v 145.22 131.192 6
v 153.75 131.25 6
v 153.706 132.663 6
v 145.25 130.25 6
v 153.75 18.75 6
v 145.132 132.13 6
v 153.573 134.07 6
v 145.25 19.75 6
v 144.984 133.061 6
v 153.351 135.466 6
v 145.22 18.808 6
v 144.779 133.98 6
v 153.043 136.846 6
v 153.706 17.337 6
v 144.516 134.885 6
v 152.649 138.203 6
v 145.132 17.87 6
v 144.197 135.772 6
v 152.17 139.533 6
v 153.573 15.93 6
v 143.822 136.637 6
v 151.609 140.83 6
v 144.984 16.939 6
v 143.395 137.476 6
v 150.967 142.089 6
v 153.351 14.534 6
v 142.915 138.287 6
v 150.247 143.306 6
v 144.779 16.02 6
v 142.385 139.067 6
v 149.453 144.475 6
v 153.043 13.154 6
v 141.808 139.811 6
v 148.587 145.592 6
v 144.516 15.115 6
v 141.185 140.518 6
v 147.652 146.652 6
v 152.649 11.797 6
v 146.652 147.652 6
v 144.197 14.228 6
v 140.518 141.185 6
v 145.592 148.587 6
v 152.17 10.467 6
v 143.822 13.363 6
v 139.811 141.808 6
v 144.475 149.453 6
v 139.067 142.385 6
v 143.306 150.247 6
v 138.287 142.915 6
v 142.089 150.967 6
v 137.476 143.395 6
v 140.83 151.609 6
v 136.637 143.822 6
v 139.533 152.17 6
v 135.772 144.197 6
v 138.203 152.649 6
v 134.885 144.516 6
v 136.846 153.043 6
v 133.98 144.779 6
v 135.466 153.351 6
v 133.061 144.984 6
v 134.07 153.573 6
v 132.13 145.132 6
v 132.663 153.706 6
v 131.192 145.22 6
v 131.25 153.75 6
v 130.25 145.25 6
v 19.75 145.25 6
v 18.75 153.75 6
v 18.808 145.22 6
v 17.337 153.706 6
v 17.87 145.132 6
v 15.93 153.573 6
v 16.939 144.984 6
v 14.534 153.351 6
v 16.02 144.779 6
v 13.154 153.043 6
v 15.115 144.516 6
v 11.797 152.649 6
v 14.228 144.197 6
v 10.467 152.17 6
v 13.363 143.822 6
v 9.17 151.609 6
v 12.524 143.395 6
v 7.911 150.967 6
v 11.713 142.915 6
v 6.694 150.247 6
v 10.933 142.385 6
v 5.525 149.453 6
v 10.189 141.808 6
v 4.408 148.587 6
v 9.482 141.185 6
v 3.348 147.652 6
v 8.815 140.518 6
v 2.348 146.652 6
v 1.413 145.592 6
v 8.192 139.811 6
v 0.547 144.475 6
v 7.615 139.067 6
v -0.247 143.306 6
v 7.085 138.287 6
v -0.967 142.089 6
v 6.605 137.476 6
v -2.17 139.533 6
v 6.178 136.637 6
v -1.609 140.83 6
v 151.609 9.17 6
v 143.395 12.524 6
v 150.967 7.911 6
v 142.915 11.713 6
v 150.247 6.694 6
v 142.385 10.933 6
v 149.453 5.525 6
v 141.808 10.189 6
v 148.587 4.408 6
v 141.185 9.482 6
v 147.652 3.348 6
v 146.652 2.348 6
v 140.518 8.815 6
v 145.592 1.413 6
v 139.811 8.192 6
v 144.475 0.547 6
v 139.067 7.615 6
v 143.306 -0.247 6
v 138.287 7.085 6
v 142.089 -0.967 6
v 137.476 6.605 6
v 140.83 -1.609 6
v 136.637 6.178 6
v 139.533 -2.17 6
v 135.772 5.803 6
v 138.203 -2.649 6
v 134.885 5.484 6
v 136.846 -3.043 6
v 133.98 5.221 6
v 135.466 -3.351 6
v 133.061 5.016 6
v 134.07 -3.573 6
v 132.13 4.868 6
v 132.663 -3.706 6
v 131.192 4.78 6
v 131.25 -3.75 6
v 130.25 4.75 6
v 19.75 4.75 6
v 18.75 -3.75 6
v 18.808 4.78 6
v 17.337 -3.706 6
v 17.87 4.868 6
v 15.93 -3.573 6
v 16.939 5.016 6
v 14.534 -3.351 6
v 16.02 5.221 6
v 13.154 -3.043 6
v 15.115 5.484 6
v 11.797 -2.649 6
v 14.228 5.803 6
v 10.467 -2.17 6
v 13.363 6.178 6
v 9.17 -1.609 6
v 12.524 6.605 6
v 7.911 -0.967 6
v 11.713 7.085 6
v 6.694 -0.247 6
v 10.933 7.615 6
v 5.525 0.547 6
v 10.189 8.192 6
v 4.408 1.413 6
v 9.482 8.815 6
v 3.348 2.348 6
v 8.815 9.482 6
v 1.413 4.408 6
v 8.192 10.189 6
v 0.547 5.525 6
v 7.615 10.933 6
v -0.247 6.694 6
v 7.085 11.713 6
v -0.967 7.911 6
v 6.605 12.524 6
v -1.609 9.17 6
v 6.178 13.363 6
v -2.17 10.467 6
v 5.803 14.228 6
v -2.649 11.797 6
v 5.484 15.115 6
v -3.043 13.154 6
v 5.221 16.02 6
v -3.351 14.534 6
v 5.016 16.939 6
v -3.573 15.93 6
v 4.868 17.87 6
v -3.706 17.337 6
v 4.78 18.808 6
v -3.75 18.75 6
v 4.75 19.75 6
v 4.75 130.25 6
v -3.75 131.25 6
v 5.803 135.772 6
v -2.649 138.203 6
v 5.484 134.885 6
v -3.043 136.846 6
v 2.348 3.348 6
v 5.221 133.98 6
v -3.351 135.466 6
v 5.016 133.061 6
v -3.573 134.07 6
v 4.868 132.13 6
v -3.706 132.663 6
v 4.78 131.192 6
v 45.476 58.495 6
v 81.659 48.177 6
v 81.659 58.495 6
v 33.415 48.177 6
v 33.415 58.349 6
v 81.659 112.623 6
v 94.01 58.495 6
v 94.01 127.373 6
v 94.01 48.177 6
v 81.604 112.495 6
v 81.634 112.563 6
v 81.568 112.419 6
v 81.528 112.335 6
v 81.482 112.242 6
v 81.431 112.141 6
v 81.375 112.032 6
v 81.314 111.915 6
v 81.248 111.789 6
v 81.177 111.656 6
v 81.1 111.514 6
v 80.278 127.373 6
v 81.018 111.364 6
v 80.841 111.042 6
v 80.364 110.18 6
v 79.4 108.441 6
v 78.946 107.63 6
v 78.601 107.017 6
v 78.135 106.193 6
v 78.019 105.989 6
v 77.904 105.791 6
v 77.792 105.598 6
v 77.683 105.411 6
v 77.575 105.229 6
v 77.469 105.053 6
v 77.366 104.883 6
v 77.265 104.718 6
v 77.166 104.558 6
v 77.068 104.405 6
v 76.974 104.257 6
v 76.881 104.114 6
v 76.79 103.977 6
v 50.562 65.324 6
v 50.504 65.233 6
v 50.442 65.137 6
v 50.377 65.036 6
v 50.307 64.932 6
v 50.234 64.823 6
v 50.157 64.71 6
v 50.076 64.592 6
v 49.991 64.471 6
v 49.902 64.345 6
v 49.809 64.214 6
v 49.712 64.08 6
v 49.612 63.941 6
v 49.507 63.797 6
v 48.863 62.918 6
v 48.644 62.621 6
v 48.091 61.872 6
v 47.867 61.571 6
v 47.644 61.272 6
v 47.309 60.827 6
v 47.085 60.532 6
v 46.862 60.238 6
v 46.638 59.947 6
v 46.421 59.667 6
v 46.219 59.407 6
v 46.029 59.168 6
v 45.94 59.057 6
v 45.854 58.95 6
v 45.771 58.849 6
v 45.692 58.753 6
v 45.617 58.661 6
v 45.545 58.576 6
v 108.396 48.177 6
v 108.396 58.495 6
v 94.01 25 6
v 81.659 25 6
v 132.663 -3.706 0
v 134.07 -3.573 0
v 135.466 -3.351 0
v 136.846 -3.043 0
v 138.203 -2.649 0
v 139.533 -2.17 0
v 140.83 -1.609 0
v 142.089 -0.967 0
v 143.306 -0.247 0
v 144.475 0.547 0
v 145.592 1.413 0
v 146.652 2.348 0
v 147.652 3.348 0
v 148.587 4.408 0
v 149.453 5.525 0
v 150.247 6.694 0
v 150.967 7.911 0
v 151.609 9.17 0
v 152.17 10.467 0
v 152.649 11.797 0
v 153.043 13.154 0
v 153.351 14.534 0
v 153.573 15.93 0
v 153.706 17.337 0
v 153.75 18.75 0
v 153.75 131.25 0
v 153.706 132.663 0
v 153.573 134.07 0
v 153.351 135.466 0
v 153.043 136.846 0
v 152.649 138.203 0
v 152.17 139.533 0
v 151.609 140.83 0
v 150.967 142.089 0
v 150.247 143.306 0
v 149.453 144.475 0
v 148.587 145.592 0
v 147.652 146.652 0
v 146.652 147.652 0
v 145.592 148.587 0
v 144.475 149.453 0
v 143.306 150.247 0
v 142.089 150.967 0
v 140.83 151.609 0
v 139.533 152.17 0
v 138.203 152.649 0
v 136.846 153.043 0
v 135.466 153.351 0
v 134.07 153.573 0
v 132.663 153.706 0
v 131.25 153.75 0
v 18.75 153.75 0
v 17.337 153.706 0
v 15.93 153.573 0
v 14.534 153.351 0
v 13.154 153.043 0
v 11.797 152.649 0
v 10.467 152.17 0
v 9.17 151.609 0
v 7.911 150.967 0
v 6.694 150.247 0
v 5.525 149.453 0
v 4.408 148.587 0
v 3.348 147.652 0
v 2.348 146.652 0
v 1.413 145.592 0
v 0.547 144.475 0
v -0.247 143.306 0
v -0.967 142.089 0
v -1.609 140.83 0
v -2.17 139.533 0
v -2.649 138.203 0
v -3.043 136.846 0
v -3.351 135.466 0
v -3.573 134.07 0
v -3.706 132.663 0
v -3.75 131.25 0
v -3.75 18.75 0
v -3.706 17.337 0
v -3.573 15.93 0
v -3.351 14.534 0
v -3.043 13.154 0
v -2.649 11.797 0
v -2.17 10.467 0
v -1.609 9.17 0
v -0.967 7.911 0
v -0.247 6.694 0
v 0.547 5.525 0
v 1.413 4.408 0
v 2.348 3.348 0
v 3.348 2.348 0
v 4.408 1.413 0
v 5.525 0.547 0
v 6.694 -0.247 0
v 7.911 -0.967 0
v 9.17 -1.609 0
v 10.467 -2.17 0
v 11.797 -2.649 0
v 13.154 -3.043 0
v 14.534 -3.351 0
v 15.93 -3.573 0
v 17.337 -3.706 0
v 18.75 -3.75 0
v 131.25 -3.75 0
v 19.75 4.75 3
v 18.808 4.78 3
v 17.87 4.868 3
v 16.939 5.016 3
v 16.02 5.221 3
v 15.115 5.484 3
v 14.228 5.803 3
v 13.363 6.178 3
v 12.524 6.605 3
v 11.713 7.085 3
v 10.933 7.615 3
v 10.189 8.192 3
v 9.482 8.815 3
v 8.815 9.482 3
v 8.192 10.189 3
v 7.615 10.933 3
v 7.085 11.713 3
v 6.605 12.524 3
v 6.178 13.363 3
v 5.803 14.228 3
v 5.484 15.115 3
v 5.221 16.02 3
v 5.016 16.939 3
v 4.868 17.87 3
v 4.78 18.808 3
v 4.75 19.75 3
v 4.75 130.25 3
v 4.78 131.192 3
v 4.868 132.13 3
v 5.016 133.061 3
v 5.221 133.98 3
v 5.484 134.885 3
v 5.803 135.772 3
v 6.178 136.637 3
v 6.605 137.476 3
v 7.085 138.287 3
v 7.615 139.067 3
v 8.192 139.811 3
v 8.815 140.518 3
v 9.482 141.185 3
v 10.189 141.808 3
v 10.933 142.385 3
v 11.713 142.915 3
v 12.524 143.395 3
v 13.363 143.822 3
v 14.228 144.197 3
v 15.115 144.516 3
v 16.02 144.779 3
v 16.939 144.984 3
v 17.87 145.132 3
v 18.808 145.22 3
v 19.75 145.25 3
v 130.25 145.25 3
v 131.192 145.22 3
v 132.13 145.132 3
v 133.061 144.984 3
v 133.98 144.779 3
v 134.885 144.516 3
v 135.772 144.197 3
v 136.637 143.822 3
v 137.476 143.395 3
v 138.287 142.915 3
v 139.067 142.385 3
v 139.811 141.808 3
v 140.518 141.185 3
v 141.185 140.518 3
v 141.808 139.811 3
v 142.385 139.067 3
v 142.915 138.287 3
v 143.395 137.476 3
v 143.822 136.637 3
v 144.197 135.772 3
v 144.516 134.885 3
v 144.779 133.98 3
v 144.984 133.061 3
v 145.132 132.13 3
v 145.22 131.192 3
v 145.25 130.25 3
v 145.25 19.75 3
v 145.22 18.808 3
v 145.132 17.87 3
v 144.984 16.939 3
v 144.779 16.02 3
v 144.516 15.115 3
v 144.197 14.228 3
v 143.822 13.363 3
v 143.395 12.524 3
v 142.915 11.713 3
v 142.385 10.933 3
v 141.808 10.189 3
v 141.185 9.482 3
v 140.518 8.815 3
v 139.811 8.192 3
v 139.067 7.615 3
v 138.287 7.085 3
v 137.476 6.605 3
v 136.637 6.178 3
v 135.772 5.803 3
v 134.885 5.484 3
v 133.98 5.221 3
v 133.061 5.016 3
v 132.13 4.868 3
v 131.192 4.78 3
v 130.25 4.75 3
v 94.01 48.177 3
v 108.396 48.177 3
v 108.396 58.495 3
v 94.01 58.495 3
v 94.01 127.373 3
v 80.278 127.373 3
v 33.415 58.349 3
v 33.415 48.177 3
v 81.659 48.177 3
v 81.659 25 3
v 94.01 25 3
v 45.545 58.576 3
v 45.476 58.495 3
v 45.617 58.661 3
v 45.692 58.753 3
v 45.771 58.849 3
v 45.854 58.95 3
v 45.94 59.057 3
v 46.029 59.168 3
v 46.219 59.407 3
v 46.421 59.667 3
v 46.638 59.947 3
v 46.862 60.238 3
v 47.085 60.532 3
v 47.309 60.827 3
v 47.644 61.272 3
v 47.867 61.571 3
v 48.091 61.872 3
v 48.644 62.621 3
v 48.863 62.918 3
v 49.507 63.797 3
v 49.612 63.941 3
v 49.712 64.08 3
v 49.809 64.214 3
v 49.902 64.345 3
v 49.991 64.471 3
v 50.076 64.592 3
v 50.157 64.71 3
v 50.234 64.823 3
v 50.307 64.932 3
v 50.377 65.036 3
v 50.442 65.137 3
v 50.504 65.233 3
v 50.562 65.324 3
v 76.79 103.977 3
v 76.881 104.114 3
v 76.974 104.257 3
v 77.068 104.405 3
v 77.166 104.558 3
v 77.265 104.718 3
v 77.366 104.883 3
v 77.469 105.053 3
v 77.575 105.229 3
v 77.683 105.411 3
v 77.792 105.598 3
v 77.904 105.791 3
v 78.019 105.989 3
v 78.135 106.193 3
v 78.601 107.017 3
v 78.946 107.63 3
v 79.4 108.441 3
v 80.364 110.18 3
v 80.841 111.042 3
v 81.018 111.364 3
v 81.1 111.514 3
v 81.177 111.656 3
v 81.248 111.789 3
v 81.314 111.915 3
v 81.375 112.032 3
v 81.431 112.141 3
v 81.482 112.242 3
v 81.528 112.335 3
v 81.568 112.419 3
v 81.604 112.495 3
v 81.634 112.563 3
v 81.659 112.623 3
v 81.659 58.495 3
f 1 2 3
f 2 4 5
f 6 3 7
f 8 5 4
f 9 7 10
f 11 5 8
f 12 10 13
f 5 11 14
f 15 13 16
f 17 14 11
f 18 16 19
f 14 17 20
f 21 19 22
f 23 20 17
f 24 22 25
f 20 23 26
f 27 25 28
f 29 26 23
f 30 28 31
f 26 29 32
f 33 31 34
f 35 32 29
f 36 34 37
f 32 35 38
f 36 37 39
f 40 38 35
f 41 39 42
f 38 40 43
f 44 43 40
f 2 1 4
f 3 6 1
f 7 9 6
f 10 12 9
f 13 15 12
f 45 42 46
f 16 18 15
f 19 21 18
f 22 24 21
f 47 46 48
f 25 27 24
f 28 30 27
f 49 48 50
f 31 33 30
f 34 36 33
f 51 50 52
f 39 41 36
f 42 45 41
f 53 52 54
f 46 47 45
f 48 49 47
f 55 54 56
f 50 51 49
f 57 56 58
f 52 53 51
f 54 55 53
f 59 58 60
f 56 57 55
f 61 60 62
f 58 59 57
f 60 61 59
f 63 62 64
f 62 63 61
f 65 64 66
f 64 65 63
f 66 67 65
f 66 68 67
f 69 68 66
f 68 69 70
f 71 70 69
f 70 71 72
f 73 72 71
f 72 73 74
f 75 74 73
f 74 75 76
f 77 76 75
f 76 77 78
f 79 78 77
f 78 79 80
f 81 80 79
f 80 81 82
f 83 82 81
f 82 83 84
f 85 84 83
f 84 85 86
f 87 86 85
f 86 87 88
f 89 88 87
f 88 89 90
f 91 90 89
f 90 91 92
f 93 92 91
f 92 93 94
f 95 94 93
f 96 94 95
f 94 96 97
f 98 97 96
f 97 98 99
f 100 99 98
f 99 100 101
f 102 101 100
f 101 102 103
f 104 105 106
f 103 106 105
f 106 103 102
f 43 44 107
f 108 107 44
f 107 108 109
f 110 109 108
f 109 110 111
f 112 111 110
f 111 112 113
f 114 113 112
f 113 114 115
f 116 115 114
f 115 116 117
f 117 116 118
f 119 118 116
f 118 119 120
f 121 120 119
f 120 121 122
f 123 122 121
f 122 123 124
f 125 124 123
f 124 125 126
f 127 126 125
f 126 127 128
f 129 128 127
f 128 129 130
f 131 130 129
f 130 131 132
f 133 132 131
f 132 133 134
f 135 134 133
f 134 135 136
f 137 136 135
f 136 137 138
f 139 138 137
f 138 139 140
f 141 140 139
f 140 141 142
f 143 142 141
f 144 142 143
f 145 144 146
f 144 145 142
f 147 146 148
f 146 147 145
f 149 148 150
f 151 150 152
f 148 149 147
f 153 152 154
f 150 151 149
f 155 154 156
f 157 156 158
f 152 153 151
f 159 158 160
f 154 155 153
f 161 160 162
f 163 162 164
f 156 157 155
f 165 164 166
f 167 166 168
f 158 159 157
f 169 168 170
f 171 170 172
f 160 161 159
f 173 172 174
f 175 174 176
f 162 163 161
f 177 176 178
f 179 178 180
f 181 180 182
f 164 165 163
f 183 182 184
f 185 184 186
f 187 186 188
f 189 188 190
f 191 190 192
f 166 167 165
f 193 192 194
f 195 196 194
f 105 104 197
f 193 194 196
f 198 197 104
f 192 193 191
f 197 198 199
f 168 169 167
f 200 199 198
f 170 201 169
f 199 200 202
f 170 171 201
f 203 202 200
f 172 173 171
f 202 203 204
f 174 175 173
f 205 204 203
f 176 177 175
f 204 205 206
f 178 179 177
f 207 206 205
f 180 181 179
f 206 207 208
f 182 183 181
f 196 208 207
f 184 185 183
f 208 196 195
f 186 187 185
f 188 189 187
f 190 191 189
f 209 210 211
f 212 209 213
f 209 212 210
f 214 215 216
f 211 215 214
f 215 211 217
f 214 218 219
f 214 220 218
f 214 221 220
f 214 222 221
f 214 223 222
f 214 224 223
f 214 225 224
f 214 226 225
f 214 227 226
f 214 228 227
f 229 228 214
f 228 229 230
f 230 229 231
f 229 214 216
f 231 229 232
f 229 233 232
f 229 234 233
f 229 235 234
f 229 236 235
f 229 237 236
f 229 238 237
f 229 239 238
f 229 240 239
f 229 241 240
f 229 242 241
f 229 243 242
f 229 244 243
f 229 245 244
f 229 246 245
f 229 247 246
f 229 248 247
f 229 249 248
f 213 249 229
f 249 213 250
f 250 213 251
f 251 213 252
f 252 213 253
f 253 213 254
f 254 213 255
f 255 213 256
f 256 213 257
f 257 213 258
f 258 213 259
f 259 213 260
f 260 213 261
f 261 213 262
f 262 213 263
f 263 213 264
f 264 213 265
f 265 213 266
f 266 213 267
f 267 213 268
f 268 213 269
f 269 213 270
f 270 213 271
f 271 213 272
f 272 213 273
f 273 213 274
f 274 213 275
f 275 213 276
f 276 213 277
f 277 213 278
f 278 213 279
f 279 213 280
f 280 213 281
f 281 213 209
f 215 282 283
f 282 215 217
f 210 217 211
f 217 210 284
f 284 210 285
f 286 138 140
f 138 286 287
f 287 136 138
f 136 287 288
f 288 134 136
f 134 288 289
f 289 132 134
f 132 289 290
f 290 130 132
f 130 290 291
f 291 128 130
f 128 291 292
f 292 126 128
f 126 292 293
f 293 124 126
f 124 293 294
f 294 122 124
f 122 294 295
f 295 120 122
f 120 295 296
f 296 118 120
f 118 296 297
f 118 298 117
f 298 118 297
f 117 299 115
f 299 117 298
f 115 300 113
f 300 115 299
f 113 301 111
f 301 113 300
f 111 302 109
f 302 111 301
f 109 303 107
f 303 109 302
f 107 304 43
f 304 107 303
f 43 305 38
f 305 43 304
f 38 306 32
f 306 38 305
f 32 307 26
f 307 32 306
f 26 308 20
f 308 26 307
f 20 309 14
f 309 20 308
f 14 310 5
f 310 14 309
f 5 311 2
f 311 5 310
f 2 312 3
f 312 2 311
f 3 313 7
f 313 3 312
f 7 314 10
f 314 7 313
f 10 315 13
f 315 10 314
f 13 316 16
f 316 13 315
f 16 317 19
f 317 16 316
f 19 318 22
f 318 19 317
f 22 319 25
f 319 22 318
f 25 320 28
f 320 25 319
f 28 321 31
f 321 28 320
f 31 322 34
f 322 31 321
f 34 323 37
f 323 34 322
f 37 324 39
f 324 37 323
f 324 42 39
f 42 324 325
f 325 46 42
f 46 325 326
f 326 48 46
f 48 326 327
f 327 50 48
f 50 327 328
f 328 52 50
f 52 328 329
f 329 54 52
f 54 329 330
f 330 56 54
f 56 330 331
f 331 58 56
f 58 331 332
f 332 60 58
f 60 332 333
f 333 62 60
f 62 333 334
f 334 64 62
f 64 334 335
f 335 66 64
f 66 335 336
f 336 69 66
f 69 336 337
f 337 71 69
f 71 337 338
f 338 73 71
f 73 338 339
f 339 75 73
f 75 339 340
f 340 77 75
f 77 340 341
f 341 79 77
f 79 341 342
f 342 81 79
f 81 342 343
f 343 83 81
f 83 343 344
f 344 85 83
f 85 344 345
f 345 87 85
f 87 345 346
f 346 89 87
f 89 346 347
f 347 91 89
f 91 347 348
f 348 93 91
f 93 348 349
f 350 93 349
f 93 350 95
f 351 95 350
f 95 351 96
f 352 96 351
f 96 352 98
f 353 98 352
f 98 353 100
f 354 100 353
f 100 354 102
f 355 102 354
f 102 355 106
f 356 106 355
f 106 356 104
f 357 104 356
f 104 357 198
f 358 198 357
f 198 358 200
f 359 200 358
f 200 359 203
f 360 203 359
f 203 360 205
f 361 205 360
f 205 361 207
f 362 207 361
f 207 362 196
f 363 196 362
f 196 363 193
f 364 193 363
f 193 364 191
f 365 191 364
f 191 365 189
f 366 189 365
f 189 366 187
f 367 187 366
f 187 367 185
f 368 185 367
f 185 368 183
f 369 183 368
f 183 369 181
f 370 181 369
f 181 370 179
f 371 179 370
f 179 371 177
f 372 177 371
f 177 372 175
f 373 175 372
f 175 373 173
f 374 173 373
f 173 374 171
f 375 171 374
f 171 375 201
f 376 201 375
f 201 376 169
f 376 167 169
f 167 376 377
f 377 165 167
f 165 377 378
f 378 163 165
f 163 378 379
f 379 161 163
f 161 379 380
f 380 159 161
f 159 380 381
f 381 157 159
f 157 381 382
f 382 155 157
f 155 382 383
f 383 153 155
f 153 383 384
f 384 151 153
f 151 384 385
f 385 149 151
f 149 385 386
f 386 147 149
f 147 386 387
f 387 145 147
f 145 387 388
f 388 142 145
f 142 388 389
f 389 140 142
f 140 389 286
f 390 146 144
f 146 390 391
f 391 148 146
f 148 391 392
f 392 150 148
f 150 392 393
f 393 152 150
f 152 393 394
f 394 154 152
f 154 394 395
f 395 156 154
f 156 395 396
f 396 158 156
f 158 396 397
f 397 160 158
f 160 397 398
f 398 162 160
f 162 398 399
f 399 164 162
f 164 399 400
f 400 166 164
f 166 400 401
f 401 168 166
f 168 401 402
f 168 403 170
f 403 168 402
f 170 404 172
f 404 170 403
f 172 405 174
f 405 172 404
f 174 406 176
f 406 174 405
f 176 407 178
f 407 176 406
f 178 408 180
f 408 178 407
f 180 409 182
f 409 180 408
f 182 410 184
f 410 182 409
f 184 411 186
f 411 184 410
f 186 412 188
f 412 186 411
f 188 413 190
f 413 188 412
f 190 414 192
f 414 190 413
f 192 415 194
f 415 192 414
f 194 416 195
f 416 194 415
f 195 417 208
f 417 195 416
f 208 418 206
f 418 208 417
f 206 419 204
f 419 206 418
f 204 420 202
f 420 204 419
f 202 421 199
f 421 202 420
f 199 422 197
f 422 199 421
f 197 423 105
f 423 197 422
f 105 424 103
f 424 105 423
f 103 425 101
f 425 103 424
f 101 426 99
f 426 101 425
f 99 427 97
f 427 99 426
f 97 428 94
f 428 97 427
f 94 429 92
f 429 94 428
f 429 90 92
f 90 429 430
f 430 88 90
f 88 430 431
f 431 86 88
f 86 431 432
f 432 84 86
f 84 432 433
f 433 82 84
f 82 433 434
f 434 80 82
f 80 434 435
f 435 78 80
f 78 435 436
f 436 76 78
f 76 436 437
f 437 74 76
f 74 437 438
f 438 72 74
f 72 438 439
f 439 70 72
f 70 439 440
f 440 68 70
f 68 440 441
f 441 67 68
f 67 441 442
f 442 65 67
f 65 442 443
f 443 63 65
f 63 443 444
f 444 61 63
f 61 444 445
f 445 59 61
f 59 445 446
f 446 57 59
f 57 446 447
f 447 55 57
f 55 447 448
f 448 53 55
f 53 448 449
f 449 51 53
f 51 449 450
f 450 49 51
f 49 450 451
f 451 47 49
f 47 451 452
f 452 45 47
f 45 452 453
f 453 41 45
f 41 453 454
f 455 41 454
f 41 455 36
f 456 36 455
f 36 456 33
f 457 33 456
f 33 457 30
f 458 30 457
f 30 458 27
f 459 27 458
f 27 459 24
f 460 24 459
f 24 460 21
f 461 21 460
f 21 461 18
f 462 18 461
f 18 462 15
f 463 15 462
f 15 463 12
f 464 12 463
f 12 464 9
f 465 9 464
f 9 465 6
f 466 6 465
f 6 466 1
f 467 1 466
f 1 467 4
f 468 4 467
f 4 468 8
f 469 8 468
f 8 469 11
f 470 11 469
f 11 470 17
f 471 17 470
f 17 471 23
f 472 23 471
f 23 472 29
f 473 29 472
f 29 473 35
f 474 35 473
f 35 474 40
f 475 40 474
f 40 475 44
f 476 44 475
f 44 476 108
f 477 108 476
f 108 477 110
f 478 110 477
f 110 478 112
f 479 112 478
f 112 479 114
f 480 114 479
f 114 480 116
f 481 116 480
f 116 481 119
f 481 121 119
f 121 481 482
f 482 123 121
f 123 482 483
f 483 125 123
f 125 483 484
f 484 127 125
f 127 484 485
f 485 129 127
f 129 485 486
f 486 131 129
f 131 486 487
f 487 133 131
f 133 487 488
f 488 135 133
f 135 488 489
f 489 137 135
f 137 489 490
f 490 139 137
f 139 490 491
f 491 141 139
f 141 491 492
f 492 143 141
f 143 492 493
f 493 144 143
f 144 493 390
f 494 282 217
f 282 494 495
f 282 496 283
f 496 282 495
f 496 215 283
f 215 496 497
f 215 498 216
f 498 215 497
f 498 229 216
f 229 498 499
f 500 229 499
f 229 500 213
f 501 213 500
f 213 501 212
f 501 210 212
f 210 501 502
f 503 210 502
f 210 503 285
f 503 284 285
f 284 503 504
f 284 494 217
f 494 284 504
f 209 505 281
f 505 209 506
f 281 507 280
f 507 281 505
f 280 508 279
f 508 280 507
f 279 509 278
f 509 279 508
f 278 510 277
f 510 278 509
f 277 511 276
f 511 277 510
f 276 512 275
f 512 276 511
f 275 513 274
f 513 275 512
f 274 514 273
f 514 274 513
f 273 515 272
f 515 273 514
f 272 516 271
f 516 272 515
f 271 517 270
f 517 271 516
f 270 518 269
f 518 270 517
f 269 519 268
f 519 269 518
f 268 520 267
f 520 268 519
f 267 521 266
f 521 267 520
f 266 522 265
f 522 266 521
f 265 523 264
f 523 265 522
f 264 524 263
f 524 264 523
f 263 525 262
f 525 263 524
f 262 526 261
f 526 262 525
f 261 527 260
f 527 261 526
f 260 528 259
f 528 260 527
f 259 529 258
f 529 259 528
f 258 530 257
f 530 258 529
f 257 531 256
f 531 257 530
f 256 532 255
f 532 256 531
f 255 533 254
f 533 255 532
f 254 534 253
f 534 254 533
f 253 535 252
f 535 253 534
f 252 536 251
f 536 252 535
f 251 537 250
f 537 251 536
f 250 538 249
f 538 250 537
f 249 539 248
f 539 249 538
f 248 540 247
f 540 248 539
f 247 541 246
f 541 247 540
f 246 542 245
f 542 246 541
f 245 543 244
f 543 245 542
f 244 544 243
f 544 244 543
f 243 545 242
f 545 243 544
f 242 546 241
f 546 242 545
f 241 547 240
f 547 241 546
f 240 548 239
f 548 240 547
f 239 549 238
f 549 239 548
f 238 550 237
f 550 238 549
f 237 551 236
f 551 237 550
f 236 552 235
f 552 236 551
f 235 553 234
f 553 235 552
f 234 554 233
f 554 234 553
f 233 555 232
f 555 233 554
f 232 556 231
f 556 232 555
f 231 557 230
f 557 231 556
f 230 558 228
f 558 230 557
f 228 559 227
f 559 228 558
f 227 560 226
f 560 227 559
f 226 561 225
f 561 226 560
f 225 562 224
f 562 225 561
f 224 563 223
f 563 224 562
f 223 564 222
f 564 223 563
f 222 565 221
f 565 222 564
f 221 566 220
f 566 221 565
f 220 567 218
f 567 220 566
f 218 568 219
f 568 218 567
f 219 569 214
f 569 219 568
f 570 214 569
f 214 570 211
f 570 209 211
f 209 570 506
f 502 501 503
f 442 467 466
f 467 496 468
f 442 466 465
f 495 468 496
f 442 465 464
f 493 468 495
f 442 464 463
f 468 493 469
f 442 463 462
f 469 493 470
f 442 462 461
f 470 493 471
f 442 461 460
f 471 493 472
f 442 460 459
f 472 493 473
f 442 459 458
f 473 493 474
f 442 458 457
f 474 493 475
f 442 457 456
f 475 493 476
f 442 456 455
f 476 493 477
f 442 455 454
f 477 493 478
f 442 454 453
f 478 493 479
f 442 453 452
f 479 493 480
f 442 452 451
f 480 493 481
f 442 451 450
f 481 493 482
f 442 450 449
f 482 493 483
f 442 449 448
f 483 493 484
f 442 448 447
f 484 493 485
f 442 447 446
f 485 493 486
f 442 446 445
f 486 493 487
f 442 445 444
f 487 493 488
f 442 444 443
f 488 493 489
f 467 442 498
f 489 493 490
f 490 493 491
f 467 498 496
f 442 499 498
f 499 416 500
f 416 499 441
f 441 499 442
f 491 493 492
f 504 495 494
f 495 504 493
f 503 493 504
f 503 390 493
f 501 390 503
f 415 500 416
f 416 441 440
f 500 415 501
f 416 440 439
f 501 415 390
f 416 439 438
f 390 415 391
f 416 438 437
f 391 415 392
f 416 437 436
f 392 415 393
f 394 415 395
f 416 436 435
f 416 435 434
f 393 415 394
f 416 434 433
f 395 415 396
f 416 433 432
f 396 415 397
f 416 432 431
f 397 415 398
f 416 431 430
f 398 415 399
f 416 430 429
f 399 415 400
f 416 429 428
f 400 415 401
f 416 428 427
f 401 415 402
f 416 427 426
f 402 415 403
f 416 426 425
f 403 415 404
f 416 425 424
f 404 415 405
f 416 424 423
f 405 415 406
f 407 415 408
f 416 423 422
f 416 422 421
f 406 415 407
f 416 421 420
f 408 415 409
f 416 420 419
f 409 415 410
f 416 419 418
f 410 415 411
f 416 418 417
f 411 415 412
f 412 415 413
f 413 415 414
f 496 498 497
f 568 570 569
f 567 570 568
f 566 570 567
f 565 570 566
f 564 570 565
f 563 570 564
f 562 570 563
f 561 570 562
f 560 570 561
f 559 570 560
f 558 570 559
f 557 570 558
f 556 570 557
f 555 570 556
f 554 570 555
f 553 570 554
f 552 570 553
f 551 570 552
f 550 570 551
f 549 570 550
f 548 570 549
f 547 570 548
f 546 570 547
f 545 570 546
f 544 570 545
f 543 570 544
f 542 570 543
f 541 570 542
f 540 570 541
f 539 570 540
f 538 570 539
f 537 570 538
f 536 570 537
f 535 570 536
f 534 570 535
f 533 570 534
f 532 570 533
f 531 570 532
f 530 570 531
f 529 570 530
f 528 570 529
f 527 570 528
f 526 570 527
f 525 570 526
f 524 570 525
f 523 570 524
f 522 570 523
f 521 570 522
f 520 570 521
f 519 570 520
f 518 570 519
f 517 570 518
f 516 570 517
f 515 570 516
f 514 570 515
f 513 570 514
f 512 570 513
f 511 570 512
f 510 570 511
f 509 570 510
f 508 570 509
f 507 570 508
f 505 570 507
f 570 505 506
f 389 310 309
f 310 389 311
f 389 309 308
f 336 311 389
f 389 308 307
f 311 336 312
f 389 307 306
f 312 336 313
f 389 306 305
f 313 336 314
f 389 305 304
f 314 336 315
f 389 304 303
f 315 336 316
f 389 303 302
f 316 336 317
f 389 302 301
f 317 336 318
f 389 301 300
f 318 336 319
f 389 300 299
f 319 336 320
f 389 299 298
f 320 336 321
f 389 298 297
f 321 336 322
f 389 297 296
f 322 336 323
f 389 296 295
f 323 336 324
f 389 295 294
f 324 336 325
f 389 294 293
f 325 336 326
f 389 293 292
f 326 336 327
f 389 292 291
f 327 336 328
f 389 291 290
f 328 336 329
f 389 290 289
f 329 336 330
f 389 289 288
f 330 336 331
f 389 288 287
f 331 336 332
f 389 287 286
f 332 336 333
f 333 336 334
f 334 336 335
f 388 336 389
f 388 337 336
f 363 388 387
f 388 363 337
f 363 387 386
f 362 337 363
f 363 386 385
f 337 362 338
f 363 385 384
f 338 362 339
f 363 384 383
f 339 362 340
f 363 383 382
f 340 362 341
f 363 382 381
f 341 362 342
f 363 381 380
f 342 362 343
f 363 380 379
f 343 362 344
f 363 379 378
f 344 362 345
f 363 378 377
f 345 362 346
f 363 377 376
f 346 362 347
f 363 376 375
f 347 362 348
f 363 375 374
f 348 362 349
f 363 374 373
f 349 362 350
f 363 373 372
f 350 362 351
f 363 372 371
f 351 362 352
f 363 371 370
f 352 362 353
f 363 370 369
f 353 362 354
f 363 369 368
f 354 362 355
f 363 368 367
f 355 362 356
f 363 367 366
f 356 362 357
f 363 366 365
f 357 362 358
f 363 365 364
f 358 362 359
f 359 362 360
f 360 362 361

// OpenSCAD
/* [Text] */

// The number on the sign
number_text = "4";

// the height of the sign in millimeters
height = 150;

/* [Thickness] */

// Thickness of the backplate in mm.
backplate_thickness = 3;

// How much the text and border is raises from backplate
number_thickness = 3;

/* [Fine tuning] */

// Roundness of corners: 0 = almost square, 100 = a circle
corner_roundness = 25; // [0:100]

// Border thickness as percentage of height
border_thickness = 5; // [0:50]

// This should usually not need to be changed
aspect = 1;

/* [Hidden] */
width = (height + height * 0.53 * (len(str(number_text)) - 1)) * aspect;

$fn=100;

border_roundness = corner_roundness / 100;

number_sign();

module anti_round(r){
    difference(){
        square(2*r,center=false);
        circle(r);
    }
}

module rounded_corner(xpos, ypos, dia, degrees) {
    translate([xpos,ypos]) {
	rotate(degrees) difference() {
	    square(dia);
	     anti_round(dia);
	}
    }
}

module rounded_square(height, width, roundness) {
    difference() {
	scale([width/height,1]) square(height);
	square(roundness);
	translate([width-roundness, 0]) square(roundness);
	translate([0, height-roundness]) square(roundness);
	translate([width-roundness, height-roundness]) square(roundness);
    }
    rounded_corner(roundness, roundness, roundness, 180);
    rounded_corner(roundness, height-roundness, roundness, 90);
    rounded_corner(width-roundness, roundness, roundness, 270);
    rounded_corner(width-roundness, height-roundness, roundness, 0);
}


module rounded_border(height, width, roundness, rwidth) {
    minkowski () {
	difference() {
	    rounded_square(height, width, roundness);
	    translate([1,1]) rounded_square(height-2, width-2, roundness);
	}
	circle(rwidth/2);
    }
}


module number_sign() {
    fudge = 0.1;
    translate([0,0,backplate_thickness-fudge]) {
	linear_extrude(number_thickness + fudge) {
	    rounded_border(height, width, height * border_roundness / 2,
			   height * border_thickness/100);
	    translate([height/5, height/6]) scale(height/14) text(str(number_text));
	}
    }

    linear_extrude(backplate_thickness) {
	minkowski () {
	    rounded_square(height, width, height * border_roundness / 2);
	    circle(height * border_thickness/100/2);
	}
    }
}
